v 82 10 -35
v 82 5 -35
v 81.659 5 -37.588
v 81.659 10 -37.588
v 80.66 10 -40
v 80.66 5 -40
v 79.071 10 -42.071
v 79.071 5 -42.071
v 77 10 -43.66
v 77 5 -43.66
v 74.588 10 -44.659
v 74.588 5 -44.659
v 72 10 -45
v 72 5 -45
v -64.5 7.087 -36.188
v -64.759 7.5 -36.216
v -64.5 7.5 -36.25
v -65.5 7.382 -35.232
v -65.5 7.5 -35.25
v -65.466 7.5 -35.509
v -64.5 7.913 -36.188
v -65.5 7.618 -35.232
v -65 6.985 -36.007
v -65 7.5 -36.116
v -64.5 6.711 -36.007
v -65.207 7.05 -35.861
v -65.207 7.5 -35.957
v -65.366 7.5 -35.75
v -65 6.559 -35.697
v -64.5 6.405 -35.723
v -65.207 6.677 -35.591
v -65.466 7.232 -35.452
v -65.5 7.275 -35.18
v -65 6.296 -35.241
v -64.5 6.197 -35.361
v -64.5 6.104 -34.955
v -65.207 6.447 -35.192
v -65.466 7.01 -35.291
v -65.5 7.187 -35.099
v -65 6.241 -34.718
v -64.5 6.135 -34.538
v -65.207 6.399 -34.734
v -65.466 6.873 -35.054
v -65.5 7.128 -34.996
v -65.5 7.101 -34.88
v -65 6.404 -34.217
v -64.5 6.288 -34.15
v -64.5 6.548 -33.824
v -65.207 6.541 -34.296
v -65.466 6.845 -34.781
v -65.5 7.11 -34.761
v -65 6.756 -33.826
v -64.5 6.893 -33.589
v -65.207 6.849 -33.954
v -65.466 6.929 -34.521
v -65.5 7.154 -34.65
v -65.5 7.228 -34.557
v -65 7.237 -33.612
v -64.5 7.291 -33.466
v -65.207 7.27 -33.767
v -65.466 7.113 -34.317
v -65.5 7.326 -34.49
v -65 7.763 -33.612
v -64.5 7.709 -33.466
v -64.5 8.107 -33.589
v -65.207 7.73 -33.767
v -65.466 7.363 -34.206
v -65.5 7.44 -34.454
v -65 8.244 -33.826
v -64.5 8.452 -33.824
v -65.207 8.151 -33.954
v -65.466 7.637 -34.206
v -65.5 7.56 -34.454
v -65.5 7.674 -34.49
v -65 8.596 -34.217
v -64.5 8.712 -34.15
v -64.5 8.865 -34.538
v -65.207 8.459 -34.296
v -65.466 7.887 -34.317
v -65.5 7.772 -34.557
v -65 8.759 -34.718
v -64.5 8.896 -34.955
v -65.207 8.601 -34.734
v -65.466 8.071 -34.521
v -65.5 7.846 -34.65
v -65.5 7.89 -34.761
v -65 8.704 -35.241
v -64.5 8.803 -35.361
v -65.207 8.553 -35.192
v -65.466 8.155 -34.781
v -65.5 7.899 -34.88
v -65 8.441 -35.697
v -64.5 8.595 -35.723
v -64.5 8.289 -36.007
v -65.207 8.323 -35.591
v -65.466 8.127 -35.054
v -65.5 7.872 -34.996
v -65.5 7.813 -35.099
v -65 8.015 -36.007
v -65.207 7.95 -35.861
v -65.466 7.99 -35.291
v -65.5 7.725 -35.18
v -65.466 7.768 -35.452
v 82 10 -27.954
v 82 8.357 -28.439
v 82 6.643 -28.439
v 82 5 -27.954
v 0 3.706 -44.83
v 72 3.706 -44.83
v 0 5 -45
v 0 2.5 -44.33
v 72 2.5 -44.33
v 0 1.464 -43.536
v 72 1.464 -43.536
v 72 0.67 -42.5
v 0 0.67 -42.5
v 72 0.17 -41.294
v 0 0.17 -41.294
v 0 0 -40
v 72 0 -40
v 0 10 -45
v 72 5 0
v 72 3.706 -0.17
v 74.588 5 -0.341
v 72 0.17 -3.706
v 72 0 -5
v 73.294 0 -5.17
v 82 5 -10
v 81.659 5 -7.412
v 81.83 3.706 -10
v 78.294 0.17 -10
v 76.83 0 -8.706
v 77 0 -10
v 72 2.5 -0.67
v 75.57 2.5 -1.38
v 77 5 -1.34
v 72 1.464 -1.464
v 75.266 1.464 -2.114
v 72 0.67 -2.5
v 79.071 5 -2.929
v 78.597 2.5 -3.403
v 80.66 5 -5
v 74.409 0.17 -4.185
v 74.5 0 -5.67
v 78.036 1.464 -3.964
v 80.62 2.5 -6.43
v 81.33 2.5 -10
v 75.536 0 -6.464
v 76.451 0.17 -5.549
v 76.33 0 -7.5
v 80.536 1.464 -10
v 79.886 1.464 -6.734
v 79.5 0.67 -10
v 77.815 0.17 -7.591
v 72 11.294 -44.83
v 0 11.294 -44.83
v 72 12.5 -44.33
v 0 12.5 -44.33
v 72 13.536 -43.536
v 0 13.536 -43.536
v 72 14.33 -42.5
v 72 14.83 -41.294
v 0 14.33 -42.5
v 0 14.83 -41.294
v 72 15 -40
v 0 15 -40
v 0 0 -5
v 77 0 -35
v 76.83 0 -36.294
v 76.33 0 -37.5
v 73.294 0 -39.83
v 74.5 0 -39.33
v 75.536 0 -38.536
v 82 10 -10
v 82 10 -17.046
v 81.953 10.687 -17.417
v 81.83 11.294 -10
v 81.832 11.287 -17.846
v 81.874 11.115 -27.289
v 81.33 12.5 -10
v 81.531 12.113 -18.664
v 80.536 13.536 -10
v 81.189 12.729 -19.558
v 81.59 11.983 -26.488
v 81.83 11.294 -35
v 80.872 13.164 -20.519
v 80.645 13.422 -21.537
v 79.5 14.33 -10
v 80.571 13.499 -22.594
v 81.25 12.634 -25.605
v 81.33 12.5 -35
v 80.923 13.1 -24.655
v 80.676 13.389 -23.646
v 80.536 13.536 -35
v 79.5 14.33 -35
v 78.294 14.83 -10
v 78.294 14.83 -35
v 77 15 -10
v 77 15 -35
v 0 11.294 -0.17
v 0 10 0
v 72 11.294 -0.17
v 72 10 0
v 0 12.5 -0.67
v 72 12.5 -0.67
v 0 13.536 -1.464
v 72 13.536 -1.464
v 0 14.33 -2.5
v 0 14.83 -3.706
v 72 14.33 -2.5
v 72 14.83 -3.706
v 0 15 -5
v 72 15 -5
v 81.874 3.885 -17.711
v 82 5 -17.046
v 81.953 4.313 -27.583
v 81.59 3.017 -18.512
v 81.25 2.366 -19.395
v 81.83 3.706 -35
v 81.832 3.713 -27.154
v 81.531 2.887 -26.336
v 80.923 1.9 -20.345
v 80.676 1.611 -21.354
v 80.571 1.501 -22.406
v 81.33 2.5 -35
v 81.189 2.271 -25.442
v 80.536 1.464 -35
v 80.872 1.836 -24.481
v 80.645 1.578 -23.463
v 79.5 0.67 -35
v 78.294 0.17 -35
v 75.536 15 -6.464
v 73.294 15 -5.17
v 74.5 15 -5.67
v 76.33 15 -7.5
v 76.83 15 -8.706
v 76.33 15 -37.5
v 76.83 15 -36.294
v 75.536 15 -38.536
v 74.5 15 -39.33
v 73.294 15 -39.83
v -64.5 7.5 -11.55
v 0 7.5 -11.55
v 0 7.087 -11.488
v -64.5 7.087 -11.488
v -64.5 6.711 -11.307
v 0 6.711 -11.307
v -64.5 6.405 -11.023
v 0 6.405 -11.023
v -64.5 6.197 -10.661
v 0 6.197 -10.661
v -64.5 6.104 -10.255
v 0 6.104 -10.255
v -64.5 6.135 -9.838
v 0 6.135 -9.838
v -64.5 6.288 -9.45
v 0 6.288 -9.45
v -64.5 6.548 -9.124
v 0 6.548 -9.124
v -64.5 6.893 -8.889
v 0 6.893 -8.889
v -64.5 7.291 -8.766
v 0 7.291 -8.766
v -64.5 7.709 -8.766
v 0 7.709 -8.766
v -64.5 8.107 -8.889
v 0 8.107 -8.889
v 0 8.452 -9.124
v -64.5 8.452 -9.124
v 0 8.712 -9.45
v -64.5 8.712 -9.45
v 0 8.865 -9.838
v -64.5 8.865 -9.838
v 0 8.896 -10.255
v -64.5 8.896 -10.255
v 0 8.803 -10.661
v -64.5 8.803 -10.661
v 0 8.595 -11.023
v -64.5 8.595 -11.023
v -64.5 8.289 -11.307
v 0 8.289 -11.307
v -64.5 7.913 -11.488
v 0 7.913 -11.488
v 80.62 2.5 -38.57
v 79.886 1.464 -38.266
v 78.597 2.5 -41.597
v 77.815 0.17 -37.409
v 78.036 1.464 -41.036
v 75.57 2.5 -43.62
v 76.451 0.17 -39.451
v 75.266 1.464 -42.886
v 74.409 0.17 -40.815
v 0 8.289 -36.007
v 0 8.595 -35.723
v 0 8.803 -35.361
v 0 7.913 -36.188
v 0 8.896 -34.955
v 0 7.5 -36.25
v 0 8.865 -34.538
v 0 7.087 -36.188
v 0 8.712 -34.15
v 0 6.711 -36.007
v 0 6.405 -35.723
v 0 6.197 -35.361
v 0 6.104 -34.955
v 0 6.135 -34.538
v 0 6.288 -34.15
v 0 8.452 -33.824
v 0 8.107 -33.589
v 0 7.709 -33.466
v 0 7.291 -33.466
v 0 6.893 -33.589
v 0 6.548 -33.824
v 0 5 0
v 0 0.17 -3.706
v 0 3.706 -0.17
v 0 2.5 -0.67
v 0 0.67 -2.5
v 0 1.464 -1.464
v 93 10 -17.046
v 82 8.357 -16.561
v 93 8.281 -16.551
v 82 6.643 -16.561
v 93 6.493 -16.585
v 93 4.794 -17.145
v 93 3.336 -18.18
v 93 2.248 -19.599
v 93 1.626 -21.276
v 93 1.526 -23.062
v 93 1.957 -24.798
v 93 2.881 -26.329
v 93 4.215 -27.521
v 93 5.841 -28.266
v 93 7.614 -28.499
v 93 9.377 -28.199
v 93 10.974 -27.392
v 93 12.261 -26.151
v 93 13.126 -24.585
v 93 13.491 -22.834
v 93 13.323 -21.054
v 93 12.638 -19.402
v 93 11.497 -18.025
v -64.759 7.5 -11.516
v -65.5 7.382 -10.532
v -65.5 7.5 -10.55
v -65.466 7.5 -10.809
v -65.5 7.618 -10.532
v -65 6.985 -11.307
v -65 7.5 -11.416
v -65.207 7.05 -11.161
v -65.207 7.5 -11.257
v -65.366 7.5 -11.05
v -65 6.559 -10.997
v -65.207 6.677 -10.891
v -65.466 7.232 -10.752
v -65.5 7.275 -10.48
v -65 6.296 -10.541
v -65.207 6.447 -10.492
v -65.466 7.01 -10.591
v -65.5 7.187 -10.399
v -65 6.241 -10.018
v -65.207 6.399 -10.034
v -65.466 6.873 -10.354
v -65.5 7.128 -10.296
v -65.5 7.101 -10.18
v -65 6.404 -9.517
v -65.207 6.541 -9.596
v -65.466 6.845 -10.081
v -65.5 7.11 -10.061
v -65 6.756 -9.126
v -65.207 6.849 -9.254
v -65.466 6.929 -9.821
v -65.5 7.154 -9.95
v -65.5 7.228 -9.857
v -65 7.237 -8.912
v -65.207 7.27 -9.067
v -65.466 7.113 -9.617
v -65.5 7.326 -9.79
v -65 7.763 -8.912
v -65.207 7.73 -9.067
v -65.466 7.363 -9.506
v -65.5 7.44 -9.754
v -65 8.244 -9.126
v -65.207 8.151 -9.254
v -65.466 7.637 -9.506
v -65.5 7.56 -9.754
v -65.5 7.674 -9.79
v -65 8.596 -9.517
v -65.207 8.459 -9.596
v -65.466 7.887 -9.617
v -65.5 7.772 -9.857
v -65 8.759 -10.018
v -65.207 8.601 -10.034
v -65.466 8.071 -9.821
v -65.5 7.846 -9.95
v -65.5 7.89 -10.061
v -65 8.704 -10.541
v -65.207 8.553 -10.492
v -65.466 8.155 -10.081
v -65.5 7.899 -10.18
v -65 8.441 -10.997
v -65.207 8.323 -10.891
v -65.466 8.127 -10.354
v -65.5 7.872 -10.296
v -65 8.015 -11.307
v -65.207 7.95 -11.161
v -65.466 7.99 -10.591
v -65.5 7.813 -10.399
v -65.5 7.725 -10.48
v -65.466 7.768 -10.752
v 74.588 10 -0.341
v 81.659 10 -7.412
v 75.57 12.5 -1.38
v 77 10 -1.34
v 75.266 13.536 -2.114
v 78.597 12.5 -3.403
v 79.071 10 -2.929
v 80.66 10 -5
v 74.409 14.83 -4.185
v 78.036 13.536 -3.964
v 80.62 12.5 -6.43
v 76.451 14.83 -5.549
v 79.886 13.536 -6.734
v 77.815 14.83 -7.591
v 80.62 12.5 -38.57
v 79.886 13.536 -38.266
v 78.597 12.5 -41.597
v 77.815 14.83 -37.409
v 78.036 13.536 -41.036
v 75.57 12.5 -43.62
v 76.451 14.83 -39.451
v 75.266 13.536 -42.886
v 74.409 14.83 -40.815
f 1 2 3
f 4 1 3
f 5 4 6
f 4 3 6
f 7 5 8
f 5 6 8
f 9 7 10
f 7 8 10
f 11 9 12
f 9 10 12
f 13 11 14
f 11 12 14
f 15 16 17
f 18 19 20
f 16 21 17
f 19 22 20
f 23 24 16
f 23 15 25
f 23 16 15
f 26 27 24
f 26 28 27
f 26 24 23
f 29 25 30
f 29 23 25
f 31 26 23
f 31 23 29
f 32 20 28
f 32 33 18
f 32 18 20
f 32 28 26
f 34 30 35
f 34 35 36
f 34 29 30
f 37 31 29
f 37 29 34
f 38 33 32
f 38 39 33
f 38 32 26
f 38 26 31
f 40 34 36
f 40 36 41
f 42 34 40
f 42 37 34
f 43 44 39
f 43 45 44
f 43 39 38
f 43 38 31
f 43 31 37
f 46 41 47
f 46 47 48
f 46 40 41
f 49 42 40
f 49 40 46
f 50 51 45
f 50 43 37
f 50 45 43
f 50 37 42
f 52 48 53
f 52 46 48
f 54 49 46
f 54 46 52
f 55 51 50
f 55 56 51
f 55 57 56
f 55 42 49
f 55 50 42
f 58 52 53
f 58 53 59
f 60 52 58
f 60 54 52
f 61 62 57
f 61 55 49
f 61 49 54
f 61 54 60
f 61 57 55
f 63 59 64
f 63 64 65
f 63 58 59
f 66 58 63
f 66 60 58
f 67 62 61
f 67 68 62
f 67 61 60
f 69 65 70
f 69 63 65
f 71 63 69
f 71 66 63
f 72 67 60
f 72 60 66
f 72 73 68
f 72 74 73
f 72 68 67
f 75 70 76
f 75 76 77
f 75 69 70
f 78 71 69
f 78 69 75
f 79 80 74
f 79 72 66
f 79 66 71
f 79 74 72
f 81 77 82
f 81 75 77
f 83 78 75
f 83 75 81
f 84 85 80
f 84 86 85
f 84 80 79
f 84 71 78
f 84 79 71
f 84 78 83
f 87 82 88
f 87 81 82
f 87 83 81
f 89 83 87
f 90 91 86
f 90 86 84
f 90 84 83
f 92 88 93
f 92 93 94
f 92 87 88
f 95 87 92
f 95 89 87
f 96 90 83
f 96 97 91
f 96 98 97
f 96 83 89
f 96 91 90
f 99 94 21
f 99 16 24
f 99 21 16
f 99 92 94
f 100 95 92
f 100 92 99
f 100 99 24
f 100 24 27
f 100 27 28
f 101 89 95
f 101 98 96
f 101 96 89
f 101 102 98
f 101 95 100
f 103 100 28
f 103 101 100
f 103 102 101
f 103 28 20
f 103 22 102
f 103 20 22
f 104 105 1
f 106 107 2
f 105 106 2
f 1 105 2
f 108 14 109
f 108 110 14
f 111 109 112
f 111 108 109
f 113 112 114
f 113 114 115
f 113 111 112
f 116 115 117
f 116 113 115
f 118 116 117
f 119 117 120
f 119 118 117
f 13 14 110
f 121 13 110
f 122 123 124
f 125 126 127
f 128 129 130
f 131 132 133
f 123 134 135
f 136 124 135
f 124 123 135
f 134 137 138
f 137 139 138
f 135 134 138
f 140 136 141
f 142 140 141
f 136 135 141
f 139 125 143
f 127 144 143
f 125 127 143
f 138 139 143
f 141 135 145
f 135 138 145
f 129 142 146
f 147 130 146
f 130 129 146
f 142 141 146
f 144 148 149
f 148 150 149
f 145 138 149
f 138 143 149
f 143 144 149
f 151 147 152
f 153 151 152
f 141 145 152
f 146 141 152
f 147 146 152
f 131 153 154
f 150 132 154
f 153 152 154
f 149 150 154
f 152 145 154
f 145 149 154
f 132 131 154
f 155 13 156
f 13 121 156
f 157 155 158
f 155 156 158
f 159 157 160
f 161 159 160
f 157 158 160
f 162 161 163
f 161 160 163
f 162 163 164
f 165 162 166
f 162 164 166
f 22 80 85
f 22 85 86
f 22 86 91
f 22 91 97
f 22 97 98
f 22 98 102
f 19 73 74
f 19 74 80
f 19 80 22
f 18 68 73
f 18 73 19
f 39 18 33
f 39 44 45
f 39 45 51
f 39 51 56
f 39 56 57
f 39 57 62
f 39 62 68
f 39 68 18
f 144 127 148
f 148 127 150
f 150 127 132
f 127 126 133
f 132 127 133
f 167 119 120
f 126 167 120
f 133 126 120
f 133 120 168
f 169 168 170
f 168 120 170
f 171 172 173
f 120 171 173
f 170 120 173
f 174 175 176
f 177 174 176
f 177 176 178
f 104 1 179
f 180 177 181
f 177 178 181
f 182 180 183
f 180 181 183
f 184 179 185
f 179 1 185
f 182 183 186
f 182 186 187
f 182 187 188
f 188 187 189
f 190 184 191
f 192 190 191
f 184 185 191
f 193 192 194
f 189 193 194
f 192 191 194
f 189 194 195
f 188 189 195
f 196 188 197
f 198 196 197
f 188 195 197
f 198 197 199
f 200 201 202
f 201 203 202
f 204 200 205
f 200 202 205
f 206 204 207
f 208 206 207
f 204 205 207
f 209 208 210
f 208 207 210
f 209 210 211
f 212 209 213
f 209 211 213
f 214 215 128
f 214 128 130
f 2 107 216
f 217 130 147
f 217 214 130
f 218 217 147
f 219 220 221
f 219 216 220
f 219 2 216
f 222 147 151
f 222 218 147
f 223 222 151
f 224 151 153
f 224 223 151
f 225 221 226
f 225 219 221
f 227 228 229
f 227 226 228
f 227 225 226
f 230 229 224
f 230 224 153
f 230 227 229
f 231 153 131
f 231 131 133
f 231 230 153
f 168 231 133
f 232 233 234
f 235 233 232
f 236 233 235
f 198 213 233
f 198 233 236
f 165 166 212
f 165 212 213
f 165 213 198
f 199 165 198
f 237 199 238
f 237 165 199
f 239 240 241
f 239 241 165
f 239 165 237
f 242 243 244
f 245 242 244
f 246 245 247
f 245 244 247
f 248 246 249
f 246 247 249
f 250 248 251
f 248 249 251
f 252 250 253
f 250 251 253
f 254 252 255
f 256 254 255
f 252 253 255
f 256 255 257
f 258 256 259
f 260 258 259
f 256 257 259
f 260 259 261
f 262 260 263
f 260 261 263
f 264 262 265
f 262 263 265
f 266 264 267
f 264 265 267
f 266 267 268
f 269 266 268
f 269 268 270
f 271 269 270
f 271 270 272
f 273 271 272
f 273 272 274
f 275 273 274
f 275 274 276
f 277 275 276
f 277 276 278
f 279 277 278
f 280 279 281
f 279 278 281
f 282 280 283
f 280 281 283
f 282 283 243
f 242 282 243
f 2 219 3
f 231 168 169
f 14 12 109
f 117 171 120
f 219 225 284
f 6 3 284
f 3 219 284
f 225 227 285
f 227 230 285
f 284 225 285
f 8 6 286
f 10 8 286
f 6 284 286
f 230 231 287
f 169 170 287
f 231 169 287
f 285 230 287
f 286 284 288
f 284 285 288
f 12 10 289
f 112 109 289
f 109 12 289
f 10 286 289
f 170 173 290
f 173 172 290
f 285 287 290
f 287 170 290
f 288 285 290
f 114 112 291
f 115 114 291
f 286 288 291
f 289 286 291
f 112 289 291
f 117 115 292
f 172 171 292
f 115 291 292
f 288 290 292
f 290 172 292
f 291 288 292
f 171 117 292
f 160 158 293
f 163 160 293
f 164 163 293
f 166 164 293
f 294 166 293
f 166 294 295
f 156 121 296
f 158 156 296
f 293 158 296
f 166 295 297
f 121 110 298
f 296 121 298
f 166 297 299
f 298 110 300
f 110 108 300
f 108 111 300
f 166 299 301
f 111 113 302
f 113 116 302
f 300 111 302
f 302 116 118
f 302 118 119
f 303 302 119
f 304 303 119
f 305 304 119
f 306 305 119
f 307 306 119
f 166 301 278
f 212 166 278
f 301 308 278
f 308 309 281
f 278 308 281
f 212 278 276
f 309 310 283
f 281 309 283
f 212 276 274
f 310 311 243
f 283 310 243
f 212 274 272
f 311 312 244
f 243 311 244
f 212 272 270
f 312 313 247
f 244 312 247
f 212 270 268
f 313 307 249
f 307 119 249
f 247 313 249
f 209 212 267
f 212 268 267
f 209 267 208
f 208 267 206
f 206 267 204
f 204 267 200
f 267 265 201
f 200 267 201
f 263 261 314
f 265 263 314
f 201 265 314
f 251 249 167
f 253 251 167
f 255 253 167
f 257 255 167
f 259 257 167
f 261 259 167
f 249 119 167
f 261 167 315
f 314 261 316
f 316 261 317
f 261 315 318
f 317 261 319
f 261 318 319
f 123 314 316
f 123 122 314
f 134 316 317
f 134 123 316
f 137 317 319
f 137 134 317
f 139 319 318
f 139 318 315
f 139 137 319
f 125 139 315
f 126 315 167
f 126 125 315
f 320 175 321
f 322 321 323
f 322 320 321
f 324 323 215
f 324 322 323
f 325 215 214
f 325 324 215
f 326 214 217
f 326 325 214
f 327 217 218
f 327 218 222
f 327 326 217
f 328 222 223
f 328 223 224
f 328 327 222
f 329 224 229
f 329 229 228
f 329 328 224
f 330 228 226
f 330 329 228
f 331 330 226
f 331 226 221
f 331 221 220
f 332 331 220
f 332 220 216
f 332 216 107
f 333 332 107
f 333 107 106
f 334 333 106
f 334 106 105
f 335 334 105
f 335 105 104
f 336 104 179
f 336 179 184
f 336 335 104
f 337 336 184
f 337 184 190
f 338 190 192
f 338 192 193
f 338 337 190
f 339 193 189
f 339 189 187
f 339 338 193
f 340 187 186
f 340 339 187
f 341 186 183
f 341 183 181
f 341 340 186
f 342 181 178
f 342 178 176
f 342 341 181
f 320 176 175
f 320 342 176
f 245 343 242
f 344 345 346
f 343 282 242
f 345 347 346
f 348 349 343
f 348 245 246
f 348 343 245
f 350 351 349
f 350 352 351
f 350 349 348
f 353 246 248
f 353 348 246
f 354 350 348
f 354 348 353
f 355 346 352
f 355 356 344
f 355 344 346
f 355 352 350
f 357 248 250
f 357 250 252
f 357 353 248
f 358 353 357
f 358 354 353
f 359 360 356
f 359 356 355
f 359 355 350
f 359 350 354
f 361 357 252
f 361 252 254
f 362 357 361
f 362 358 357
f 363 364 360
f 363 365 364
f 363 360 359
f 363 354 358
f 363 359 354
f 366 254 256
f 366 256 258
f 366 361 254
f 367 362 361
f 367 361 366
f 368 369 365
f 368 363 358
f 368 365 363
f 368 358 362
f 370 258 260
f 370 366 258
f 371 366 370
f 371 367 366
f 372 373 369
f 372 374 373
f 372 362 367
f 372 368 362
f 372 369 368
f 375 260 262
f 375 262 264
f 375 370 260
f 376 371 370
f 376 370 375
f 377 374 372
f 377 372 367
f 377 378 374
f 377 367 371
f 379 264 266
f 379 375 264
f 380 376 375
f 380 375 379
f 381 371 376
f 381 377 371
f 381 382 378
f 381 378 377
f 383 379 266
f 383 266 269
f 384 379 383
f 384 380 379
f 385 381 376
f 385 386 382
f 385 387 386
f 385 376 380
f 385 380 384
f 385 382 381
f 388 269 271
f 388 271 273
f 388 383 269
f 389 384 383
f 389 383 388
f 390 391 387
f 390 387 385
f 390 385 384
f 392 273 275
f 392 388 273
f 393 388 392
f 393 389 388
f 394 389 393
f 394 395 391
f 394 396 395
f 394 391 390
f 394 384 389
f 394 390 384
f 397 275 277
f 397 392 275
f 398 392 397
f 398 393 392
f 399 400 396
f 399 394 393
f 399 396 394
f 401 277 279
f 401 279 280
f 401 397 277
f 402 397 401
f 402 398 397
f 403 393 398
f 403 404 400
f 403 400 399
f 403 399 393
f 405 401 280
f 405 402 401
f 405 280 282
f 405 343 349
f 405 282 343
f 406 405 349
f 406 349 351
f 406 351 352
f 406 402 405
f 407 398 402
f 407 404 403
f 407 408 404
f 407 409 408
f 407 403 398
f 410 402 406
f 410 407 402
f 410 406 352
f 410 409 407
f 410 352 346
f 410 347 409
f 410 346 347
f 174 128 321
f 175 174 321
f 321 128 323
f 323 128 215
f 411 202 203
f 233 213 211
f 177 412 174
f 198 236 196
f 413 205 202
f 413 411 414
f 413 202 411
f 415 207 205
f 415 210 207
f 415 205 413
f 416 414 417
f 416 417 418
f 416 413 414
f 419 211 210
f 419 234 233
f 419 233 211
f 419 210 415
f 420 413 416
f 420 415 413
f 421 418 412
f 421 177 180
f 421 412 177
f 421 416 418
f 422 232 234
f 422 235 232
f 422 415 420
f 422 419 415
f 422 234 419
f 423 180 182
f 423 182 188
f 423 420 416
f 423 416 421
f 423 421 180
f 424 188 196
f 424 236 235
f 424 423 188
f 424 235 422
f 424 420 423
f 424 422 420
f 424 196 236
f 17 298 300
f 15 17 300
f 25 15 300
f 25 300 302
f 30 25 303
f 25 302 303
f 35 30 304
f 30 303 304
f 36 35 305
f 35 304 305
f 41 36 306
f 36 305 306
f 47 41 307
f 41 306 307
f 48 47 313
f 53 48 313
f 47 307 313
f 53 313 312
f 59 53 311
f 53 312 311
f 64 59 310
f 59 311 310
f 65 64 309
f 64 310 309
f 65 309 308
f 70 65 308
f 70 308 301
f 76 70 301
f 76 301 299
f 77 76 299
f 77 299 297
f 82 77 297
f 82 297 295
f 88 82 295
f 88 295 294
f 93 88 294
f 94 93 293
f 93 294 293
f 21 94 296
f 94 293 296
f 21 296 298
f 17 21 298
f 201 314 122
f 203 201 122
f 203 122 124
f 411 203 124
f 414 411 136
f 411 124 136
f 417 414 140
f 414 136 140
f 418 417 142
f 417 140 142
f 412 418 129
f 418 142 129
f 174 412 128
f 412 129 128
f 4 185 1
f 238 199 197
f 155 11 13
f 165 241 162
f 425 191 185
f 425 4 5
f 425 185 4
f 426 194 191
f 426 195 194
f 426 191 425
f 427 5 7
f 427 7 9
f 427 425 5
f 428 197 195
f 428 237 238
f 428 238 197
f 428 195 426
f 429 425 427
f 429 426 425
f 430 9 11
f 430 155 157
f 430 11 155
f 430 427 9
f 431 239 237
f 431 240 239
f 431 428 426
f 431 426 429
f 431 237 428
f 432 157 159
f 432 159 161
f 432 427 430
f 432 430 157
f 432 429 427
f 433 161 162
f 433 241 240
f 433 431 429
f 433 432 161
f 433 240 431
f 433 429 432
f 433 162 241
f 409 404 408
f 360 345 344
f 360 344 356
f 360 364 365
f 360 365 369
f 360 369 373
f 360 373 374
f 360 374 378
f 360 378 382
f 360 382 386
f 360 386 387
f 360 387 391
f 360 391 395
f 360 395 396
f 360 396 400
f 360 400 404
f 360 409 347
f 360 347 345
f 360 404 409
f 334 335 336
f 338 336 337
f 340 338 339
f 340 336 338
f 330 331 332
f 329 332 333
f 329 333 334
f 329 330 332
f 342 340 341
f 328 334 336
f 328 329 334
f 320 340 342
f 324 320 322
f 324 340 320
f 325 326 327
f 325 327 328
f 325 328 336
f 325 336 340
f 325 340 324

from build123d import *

# Parameters (mm, degrees)
BOSS_EXTRUDE1_DEPTH = 15
FILLET1_R           = 5
SKETCH2_R           = 6
BOSS_EXTRUDE2_DEPTH = 11
SKETCH3_R           = 1.4
BOSS_EXTRUDE3_DEPTH = 65.5
FILLET2_R           = 1


with BuildPart() as part:
    # Sketch1 → Boss-Extrude1 (new body)
    with BuildSketch(Plane(origin=(0, 0, 0), x_dir=(1, 0, 0), z_dir=(0, 1, 0))):
        with BuildLine():
            Line((0, 0), (72, 0))
            ThreePointArc((72, 0), (79.071067812, 2.928932188), (82, 10))
            Line((82, 10), (82, 35))
            ThreePointArc((82, 35), (79.071067812, 42.071067812), (72, 45))
            Line((72, 45), (0, 45))
            Line((0, 45), (0, 0))
        make_face()
    extrude(amount=BOSS_EXTRUDE1_DEPTH)

    # Fillet1
    fillet1_edges = [part.edges().sort_by_distance(p)[0] for p in [
        (79.071067812, 15, -2.928932188),
        (82, 15, -22.5),
        (79.071067812, 15, -42.071067812),
        (36, 15, -45),
        (36, 0, -45),
        (79.071067812, 0, -42.071067812),
        (82, 0, -22.5),
        (79.071067812, 0, -2.928932188),
        (36, 0, 0),
        (36, 15, 0),
    ]]
    fillet(fillet1_edges, radius=FILLET1_R)

    # Sketch2 → Boss-Extrude2 (add, symmetric)
    with BuildSketch(Plane(origin=(82, 0, 0), x_dir=(0, 0, -1), z_dir=(1, 0, 0))):
        with Locations(Location((22.5, 7.5, 0), (0, 0, 155.375681648))):
            Circle(SKETCH2_R)
    extrude(amount=BOSS_EXTRUDE2_DEPTH, both=True)

    # Sketch3 → Boss-Extrude3 (add)
    with BuildSketch(Plane.ZY):
        with Locations(Location((-34.85, 7.5, 0), (0, 0, 180))):
            Circle(SKETCH3_R)
        with Locations(Location((-10.15, 7.5, 0), (0, 0, 180))):
            Circle(SKETCH3_R)
    extrude(amount=BOSS_EXTRUDE3_DEPTH)

    # Fillet2
    fillet2_edges = [part.edges().sort_by_distance(p)[0] for p in [
        (-65.5, 7.5, -33.45),
        (-65.5, 7.5, -8.75),
    ]]
    fillet(fillet2_edges, radius=FILLET2_R)


solid = part.part
